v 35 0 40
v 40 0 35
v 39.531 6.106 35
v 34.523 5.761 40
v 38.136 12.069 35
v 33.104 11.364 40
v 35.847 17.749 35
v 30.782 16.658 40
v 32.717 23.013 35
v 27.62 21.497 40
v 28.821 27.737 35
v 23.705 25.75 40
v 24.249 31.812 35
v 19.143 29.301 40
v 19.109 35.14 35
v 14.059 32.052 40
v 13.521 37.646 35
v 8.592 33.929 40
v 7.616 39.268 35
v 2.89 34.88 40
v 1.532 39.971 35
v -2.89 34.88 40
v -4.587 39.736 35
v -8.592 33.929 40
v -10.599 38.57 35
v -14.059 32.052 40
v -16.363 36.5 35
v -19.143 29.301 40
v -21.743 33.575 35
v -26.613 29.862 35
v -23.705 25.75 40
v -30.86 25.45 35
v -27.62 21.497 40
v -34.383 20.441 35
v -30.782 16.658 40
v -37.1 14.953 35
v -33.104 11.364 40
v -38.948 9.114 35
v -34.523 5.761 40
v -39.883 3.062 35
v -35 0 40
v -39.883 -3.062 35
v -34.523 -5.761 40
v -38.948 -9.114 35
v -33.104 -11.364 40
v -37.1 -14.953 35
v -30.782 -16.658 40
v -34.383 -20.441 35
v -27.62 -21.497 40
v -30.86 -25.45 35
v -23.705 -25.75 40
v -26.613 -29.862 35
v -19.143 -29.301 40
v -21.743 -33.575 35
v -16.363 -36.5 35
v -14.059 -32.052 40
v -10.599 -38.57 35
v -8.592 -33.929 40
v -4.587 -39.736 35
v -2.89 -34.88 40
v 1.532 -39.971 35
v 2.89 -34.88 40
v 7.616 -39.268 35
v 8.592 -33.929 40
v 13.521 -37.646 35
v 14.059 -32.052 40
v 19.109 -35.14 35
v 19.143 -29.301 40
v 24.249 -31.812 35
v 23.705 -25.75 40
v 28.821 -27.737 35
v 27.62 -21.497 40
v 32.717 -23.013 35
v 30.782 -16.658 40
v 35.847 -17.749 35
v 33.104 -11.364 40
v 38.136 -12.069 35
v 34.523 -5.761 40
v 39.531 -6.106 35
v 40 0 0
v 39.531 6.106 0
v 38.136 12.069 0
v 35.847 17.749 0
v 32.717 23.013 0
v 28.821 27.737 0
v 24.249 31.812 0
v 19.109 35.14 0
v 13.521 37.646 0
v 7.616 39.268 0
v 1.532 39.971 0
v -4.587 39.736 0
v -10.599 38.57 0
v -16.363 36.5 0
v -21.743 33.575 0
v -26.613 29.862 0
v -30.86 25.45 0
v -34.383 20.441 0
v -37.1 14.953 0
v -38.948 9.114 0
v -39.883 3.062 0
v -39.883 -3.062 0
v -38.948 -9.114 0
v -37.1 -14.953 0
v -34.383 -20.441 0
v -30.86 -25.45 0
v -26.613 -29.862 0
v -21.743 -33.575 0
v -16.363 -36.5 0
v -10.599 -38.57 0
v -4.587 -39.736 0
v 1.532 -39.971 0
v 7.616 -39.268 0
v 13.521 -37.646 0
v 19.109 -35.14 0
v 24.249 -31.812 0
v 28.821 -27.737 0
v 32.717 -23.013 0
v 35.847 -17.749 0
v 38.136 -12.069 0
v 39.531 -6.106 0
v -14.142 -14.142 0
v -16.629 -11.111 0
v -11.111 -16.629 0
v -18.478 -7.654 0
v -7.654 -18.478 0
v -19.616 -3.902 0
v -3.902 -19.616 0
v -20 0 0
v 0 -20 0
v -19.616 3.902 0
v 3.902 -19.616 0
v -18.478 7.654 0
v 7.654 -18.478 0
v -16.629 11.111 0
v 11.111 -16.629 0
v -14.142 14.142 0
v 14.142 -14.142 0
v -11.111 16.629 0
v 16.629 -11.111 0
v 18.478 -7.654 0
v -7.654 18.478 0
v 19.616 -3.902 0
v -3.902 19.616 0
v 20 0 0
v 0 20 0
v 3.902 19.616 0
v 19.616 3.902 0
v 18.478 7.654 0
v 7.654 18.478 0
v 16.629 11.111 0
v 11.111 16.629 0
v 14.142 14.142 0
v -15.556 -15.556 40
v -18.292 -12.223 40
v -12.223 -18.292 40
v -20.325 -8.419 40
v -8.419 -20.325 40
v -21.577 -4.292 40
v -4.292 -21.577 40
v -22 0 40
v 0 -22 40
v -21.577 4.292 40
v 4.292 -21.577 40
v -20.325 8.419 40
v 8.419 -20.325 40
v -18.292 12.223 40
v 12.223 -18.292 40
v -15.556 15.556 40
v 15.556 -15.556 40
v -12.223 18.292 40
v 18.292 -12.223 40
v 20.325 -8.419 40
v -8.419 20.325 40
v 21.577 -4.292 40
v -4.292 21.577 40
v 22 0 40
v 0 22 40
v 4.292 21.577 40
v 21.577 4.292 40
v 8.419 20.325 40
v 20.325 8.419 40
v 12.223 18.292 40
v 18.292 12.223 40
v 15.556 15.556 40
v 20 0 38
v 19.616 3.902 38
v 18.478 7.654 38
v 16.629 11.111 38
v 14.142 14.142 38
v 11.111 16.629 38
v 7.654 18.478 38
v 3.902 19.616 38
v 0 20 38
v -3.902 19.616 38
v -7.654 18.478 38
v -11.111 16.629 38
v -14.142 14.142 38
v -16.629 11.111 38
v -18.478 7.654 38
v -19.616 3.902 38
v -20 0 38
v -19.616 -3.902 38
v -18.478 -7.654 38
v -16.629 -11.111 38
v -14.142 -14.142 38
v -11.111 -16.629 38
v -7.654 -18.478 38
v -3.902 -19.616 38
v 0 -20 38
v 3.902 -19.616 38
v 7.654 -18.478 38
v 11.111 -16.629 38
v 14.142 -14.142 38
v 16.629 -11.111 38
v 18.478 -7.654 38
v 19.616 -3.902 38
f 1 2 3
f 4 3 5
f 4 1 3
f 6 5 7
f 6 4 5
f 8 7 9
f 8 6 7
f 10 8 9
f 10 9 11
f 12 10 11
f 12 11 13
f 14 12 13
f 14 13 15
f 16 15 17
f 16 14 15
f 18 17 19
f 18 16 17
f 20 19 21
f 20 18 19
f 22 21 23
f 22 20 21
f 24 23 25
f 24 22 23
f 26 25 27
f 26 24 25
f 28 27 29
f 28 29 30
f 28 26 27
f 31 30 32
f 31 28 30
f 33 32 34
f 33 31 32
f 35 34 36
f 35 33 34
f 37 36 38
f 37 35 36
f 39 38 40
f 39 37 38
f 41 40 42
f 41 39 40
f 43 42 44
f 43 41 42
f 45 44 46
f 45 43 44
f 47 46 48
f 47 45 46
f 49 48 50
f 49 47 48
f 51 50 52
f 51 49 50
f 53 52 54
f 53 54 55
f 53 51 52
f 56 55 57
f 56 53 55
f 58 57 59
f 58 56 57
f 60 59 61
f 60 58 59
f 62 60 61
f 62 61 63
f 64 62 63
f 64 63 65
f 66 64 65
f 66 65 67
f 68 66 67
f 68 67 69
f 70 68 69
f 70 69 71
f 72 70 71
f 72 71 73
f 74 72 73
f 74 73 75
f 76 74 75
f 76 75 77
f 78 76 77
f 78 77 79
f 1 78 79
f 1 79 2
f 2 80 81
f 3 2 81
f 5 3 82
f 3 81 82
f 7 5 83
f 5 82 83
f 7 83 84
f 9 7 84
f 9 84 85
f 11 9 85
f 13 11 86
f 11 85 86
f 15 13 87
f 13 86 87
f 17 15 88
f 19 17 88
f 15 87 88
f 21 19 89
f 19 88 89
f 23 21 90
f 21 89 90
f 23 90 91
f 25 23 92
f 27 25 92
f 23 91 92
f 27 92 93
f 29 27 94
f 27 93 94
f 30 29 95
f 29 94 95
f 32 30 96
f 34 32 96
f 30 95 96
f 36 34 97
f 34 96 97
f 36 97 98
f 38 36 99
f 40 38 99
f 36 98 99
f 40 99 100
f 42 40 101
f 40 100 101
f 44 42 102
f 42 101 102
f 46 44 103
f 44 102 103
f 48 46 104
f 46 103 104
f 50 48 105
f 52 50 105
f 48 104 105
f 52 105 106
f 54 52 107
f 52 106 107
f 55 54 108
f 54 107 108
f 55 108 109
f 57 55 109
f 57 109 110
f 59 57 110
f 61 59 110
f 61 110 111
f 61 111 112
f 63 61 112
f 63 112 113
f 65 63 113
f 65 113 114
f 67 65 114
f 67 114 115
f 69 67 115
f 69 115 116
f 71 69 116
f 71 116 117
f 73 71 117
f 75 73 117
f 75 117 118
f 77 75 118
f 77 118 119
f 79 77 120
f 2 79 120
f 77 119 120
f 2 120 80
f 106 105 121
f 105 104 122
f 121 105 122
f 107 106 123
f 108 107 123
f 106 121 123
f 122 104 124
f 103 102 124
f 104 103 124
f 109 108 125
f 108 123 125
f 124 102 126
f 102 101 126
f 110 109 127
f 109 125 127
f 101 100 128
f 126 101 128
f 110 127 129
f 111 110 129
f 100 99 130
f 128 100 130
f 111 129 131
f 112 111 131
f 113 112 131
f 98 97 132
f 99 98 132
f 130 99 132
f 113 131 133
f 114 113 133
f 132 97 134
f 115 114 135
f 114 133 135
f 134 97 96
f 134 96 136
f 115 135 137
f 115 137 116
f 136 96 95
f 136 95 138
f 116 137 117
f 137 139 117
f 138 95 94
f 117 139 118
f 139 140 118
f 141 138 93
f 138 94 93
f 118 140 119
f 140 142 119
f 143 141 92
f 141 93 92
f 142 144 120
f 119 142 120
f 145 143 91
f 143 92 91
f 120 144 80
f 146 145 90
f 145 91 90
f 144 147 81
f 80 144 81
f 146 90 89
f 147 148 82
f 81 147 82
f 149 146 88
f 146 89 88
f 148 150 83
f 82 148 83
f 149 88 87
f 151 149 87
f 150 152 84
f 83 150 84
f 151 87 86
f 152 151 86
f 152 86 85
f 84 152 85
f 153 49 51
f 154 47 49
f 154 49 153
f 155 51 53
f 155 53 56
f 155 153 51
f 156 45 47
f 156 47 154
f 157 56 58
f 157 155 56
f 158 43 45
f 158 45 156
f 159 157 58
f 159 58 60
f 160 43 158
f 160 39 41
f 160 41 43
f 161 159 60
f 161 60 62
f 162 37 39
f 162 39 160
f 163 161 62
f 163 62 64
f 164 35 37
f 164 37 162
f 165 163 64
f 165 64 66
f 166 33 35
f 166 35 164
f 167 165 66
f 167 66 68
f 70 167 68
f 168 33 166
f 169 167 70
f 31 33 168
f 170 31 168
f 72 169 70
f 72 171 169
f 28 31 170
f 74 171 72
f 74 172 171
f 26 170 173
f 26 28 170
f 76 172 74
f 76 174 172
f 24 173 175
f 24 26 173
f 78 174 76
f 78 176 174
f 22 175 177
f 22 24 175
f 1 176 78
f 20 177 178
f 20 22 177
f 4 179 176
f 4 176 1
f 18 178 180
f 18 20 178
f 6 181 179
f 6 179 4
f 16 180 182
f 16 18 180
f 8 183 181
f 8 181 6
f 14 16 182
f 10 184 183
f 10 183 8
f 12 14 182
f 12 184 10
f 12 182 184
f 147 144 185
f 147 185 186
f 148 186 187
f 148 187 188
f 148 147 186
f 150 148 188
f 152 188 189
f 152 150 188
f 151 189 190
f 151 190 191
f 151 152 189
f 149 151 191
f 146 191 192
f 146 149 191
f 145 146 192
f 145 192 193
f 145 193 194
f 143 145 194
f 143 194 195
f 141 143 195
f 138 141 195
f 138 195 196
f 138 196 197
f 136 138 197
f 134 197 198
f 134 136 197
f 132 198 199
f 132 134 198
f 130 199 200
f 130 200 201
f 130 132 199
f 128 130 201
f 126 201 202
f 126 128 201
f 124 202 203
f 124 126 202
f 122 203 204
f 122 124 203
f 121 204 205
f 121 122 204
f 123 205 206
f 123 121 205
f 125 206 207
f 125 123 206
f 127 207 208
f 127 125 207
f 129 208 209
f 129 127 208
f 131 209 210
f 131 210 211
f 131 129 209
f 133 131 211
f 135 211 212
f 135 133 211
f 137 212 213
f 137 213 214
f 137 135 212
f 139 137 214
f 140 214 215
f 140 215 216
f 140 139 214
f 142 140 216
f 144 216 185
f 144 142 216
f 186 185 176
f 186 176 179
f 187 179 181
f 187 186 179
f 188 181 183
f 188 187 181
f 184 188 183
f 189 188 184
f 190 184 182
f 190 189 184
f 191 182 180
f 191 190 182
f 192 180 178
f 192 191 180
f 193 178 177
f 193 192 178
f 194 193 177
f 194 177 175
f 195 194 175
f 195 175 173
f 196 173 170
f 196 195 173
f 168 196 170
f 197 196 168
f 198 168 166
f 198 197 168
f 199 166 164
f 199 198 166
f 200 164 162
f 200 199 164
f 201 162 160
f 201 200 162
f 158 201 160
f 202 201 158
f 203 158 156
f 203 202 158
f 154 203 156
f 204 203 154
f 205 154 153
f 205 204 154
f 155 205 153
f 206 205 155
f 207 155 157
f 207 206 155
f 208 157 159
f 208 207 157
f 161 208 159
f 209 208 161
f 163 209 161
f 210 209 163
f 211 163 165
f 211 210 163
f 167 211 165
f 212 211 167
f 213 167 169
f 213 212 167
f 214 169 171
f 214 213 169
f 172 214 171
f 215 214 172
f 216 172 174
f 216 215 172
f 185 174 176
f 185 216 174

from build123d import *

# Parameters (mm, degrees)
F0_R     = 40
F0_R_2   = 20
F1_DEPTH = 40
F2_SIZE  = 5
F3_SIZE  = 2


with BuildPart() as f1:
    # F0 (on Top) → F1 (new body)
    with BuildSketch(Plane.XY):
        Circle(F0_R)
        Circle(F0_R_2, mode=Mode.SUBTRACT)
    extrude(amount=F1_DEPTH)

    # F2
    f2_edges = [f1.edges().sort_by_distance(p)[0] for p in [
        (-40, 0, 40),
    ]]
    chamfer(f2_edges, length=F2_SIZE)

    # F3
    f3_edges = [f1.edges().sort_by_distance(p)[0] for p in [
        (-20, 0, 40),
    ]]
    chamfer(f3_edges, length=F3_SIZE)


solid = f1.part
